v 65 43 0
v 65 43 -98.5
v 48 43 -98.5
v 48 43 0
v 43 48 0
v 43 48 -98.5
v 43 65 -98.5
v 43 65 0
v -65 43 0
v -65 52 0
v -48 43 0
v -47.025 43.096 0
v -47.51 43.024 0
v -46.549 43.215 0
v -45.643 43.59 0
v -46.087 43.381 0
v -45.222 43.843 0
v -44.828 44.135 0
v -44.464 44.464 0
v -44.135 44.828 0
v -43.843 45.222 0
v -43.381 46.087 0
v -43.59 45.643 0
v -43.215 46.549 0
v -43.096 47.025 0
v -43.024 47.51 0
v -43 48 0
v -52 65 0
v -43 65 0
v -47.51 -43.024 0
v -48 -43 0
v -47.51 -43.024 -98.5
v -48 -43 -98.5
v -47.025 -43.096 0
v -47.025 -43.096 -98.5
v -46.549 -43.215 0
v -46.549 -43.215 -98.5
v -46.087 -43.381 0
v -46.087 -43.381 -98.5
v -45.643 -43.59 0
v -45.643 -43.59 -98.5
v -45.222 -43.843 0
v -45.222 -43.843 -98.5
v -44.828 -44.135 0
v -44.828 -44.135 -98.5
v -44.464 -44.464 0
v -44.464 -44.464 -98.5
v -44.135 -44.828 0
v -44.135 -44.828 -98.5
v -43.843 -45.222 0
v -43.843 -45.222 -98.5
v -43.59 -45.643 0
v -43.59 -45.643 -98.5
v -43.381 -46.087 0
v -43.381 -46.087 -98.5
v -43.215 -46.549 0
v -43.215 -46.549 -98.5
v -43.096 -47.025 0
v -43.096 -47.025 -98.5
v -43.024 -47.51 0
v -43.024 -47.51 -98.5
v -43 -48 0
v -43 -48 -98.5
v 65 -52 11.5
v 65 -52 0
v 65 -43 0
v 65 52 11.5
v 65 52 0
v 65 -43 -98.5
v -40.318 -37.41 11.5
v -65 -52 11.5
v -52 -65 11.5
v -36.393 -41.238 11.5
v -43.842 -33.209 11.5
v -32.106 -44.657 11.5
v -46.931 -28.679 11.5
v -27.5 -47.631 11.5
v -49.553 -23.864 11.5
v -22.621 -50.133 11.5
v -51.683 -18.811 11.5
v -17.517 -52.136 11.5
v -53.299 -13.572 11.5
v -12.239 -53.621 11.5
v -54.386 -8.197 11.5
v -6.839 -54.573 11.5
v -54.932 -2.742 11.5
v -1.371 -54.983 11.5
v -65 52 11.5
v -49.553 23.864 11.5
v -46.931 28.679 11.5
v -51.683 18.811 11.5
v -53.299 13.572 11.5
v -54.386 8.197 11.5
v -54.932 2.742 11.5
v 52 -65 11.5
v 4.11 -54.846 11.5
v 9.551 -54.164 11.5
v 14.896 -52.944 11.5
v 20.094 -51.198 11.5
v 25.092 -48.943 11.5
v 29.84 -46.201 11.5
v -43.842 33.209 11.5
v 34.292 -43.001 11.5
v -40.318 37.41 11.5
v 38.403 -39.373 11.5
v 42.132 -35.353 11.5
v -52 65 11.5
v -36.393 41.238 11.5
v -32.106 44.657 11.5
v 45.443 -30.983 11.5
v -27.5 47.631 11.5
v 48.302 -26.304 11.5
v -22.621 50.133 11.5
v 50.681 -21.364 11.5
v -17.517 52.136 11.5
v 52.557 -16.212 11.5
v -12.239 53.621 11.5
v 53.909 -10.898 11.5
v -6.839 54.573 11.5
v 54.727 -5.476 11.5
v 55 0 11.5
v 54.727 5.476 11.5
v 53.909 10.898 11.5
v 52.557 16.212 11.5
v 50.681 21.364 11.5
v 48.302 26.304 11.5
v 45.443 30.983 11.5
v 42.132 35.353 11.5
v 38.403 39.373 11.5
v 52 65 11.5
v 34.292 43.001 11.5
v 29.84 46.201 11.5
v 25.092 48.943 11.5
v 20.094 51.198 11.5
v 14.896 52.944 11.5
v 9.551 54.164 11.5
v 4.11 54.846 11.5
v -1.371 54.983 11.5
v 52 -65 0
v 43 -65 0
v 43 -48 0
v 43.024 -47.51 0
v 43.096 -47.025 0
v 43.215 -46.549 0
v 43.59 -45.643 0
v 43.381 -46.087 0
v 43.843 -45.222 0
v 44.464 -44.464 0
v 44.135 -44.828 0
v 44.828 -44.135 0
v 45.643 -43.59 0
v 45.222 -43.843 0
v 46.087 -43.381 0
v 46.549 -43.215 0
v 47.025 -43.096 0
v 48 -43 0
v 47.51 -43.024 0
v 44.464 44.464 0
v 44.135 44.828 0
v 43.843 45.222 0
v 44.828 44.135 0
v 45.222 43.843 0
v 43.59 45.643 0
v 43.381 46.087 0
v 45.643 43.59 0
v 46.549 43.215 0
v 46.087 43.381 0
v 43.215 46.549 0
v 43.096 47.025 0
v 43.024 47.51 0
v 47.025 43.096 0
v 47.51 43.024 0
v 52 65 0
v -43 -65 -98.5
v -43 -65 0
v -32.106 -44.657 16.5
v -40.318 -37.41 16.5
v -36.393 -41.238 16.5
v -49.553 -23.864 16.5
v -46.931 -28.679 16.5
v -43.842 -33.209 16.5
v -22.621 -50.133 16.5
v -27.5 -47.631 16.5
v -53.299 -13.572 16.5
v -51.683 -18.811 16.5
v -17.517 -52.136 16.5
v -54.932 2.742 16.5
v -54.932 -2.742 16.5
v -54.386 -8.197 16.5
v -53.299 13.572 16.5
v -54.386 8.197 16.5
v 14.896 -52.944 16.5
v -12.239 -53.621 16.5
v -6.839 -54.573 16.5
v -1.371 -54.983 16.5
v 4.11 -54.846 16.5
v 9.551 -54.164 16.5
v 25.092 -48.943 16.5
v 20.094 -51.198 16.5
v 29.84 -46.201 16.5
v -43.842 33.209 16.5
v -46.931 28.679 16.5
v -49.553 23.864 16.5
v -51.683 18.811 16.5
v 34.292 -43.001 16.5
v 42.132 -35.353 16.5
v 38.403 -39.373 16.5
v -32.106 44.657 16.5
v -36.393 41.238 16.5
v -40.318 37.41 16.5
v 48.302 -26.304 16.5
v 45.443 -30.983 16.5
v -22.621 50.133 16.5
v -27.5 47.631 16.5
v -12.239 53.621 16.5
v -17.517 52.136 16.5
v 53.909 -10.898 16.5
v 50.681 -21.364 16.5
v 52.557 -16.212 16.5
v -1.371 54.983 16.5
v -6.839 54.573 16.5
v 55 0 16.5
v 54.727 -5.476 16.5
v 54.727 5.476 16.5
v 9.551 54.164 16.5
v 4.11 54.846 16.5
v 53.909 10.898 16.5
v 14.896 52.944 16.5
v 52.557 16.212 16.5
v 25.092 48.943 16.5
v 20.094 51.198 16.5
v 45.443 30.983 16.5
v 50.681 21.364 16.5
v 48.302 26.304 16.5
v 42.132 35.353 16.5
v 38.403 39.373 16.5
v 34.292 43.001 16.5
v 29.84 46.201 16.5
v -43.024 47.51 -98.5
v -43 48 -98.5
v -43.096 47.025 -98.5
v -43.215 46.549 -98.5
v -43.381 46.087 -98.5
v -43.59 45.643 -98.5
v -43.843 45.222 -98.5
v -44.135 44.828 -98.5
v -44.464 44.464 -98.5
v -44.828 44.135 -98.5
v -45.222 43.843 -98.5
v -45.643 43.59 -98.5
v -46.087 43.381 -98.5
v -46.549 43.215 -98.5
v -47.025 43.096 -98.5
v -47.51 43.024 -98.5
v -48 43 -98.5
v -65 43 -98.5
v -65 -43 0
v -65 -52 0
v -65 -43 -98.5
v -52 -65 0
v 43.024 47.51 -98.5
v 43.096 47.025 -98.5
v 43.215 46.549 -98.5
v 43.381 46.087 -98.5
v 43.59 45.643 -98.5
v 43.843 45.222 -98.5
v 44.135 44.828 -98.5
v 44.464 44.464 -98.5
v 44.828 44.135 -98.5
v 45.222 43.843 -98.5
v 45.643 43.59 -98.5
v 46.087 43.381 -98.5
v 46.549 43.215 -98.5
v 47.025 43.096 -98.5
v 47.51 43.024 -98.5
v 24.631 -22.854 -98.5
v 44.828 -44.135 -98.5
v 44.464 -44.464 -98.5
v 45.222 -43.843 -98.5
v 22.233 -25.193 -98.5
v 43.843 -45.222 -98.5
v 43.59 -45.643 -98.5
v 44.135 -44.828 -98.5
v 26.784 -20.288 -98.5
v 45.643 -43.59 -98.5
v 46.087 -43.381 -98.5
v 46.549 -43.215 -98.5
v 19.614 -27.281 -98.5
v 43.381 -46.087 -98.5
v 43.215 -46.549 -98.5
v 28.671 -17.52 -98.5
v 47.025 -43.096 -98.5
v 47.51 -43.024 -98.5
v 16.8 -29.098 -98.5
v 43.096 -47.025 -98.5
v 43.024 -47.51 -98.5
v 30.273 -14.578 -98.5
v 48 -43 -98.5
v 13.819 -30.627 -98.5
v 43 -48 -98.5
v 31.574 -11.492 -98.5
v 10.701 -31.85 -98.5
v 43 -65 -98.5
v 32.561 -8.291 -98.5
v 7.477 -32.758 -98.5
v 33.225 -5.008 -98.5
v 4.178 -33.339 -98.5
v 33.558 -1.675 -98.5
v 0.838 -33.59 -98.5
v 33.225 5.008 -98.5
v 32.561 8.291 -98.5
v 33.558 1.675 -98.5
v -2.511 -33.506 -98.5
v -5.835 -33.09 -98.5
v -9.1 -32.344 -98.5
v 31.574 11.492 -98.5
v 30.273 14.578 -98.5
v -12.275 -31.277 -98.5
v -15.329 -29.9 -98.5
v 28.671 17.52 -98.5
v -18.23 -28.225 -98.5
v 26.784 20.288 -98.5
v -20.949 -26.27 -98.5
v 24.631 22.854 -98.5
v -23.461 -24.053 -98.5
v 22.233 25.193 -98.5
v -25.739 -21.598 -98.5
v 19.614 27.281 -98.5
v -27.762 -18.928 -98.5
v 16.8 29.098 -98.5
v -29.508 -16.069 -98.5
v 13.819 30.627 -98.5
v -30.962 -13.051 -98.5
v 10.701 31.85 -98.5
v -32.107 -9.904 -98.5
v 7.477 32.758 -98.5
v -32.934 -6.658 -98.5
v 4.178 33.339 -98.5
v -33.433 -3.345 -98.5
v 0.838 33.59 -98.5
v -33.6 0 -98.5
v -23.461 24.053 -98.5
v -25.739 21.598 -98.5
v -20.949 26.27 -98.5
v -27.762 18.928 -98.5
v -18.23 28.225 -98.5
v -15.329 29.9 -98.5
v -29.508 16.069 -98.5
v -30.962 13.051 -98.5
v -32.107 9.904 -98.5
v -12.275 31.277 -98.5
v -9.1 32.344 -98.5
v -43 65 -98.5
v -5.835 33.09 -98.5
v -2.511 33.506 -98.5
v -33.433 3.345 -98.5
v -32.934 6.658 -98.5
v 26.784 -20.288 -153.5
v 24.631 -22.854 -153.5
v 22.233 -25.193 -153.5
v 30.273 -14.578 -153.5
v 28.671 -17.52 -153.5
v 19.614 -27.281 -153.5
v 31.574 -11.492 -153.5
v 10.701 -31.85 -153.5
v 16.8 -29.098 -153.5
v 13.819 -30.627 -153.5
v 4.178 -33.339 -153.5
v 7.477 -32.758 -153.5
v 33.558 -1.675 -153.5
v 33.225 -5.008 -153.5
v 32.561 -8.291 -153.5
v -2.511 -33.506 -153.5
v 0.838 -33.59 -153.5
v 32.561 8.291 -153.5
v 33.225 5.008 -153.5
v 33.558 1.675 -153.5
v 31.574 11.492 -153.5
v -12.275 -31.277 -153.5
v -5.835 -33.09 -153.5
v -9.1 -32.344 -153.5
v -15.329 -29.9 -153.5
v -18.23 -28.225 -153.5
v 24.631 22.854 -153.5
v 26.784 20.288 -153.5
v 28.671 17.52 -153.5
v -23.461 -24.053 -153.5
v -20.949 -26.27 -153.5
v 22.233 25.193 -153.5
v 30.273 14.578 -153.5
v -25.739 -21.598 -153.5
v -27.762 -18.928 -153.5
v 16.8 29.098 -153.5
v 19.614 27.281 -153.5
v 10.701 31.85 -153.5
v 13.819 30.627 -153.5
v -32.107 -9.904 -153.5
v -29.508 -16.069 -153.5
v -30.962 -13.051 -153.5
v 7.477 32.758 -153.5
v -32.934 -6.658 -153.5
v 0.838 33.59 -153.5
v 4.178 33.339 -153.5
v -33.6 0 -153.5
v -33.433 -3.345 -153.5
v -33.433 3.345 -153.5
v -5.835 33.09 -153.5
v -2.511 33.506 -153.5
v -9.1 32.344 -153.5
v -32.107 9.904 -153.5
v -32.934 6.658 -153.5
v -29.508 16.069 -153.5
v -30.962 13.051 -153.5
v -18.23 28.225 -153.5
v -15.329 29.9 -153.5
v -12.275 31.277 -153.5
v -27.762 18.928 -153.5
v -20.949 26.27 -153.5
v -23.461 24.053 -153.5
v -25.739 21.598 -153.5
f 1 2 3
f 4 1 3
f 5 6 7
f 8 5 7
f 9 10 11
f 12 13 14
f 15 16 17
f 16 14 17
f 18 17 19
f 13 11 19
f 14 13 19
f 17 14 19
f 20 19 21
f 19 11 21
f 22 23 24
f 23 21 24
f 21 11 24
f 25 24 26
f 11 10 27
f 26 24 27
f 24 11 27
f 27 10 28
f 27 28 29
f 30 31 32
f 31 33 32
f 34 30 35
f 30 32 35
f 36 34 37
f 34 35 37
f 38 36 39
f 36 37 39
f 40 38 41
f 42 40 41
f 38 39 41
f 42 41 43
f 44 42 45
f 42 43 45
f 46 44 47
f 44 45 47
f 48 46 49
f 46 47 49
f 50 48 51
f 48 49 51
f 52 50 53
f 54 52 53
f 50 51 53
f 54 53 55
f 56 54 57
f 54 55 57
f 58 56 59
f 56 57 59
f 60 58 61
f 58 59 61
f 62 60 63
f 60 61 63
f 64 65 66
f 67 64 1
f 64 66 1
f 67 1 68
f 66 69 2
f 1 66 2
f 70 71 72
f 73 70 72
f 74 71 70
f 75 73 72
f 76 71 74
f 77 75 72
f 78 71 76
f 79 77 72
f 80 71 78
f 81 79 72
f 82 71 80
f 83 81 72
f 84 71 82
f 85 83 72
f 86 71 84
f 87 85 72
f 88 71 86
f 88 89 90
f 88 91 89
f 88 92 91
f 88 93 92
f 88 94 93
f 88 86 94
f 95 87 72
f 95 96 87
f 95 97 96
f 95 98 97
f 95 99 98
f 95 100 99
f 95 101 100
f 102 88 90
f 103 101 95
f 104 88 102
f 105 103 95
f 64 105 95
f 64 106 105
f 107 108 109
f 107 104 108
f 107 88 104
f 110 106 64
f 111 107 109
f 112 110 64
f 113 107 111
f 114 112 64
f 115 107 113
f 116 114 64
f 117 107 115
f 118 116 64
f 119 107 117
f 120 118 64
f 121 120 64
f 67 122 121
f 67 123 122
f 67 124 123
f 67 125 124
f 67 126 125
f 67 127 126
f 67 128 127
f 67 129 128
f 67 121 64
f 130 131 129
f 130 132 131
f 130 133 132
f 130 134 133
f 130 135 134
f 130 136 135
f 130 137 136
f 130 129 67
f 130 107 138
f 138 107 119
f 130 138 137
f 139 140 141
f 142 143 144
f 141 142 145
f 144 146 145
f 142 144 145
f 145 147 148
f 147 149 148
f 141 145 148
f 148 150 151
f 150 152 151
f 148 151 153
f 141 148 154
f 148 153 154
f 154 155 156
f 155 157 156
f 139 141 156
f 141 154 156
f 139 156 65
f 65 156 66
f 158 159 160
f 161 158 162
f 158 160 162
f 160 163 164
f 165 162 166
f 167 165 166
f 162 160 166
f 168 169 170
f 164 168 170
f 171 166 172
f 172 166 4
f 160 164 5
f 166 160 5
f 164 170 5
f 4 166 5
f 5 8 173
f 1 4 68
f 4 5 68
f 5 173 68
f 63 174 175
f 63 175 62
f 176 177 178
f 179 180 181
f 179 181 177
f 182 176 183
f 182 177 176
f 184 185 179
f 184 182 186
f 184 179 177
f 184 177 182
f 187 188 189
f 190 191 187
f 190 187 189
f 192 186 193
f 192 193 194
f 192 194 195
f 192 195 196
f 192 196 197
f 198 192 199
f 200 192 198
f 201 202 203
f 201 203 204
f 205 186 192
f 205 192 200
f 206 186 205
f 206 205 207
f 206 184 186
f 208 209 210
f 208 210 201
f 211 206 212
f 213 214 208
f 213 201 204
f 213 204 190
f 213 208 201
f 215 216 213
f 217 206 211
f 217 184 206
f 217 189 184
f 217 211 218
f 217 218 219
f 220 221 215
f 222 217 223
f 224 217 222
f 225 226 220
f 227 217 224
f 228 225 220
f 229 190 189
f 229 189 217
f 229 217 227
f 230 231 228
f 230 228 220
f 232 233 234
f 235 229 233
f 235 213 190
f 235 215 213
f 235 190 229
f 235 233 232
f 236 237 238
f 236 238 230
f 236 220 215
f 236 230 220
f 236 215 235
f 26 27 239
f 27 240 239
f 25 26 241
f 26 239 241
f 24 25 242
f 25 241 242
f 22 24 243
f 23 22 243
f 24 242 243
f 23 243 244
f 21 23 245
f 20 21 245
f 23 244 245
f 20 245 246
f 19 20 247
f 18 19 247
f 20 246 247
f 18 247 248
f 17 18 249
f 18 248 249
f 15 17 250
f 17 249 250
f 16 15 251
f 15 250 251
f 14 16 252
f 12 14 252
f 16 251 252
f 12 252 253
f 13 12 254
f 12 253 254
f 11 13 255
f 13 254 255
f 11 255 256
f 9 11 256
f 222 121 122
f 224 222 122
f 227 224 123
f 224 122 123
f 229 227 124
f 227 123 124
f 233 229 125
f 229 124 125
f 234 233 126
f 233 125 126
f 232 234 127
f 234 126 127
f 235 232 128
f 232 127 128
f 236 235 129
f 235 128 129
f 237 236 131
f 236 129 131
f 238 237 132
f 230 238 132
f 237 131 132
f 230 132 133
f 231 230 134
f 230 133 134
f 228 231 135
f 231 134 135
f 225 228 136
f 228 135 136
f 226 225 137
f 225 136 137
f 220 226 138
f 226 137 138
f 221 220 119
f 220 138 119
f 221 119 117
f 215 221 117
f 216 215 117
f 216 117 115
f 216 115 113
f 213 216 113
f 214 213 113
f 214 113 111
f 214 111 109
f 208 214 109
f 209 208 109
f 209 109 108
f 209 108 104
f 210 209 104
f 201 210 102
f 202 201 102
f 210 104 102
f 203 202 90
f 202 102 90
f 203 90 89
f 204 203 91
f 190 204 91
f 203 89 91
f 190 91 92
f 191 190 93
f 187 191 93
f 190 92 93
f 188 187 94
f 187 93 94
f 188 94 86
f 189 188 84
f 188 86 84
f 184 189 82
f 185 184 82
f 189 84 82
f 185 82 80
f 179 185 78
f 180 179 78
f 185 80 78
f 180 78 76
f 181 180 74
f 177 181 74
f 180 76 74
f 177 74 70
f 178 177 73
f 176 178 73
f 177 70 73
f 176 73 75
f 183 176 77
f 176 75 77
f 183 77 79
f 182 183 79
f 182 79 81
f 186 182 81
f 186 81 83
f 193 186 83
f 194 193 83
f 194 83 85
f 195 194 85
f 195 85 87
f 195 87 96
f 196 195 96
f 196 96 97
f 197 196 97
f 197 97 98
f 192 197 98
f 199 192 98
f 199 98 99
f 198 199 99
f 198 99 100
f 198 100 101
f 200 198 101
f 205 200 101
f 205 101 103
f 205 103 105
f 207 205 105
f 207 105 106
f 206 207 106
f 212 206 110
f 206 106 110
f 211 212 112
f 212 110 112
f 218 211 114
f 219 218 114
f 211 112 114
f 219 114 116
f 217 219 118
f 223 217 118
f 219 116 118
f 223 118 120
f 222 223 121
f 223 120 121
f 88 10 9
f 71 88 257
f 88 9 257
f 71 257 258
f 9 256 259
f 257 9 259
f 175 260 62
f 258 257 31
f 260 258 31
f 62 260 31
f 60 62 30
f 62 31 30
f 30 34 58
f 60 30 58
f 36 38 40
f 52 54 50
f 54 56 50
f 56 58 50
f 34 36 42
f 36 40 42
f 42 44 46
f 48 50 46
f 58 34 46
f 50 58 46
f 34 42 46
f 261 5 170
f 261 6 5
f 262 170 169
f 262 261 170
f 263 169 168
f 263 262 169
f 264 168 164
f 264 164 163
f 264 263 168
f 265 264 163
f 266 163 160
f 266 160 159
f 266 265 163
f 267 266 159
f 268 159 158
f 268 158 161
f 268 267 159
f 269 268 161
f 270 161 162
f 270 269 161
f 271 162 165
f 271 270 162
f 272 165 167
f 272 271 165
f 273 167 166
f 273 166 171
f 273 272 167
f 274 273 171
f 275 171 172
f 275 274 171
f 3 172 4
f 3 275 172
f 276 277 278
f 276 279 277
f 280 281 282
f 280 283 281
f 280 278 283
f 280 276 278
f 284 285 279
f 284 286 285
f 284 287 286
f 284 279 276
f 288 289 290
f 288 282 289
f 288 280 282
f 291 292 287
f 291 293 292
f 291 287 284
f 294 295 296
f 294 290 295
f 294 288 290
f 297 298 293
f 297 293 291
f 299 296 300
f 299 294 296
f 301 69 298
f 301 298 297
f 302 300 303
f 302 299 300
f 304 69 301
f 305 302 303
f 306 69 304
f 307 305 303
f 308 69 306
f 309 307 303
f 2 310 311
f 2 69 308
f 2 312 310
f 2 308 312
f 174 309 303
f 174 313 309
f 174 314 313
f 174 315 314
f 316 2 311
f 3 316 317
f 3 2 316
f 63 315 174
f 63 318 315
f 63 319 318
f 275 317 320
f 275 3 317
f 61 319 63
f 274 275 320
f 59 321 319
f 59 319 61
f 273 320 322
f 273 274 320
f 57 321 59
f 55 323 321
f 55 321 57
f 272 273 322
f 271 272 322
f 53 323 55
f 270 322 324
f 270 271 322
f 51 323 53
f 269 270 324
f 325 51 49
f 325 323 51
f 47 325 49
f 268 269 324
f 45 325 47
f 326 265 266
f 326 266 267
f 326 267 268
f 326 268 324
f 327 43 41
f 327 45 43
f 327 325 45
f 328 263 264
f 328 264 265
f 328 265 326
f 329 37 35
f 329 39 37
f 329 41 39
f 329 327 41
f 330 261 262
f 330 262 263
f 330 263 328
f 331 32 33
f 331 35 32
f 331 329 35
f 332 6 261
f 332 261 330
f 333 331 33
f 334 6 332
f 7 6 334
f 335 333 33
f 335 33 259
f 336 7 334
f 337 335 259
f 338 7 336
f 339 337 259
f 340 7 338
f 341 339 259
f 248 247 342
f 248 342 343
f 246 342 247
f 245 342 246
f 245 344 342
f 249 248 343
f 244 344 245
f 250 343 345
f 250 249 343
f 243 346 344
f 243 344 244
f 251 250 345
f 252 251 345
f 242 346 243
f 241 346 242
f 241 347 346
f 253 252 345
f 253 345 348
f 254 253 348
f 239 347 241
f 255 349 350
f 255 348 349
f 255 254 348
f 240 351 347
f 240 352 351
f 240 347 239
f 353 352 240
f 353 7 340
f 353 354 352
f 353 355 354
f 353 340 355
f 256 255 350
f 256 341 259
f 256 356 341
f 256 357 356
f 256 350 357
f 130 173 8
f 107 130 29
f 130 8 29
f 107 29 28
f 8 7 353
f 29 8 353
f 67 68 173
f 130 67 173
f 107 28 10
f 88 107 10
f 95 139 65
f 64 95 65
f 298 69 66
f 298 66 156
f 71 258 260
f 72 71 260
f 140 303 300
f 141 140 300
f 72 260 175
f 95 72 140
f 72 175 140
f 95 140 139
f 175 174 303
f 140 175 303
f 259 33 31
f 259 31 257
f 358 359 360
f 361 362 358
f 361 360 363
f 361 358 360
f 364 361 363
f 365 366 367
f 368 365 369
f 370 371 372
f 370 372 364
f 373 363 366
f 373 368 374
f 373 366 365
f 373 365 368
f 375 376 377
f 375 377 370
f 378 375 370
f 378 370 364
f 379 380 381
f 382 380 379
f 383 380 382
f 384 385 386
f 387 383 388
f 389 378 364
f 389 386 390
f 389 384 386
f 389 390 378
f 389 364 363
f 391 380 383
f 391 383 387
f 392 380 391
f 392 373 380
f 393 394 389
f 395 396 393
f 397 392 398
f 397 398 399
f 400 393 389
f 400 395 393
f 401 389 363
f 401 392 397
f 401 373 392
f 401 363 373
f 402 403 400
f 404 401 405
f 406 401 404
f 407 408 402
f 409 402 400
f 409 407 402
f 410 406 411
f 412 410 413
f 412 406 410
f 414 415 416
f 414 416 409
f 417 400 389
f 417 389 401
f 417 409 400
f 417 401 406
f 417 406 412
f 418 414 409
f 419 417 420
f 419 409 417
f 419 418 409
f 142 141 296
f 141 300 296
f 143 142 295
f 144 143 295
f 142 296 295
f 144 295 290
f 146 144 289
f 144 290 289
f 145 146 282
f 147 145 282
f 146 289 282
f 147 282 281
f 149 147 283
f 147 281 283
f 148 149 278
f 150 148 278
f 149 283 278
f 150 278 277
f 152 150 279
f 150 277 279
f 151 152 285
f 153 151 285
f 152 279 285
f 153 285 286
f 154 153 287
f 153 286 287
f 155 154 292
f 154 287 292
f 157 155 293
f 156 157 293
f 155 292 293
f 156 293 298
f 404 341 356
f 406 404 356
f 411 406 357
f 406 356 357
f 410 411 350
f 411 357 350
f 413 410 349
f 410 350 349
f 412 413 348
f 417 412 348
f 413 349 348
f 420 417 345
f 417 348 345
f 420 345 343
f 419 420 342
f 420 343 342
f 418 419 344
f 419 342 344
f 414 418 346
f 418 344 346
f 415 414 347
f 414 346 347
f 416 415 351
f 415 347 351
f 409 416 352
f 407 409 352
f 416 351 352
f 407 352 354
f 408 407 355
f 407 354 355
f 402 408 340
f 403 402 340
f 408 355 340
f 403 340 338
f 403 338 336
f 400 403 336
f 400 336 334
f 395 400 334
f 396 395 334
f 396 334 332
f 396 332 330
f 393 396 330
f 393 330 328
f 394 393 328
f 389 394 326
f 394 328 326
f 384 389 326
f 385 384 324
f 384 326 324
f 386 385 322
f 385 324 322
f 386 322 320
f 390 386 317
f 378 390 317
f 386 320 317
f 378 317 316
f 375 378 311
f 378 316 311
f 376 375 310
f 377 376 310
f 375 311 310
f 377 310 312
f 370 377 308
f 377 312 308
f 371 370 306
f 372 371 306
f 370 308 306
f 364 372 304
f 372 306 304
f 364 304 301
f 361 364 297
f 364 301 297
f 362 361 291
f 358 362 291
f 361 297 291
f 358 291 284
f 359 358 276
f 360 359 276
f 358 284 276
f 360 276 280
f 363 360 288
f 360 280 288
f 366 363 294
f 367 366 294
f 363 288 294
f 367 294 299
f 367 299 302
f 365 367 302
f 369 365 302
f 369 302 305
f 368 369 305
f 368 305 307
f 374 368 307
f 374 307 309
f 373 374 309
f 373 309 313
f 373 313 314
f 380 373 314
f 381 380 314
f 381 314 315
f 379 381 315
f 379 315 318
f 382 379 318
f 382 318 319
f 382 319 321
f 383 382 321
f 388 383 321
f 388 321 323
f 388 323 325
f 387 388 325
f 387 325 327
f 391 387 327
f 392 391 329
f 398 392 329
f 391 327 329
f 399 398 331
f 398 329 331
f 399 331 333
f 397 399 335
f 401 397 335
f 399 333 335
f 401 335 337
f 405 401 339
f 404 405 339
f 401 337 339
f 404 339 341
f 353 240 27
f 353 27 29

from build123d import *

# Parameters (mm, degrees)
EXTRUDE_1_DEPTH = 11.5
SKETCH_2_R      = 55
EXTRUDE_2_DEPTH = 5
SKETCH_5_W      = 86
SKETCH_5_H      = 22
SKETCH_5_W_2    = 22
SKETCH_5_H_2    = 86
EXTRUDE_4_DEPTH = 98.5
FILLET_1_R      = 5
SKETCH_6_R      = 33.6
EXTRUDE_5_DEPTH = 55


with BuildPart() as part:
    # 草图1 → 凸台-拉伸1 (new body)
    with BuildSketch(Plane.XY):
        Polygon((-65, -52), (-52, -65), (52, -65), (65, -52), (65, 52), (52, 65), (-52, 65), (-65, 52), align=None)
    extrude(amount=EXTRUDE_1_DEPTH)

    # 草图2 → 凸台-拉伸2 (add)
    with BuildSketch(Plane.XY.offset(11.5)):
        Circle(SKETCH_2_R)
    extrude(amount=EXTRUDE_2_DEPTH)

    # 草图5 → 凸台-拉伸4 (add)
    with BuildSketch(Plane(origin=(0, 0, 0), x_dir=(-1, 0, 0), z_dir=(0, 0, -1))):
        with Locations((0, 54)):
            Rectangle(SKETCH_5_W, SKETCH_5_H)
        with Locations((-54, 0)):
            Rectangle(SKETCH_5_W_2, SKETCH_5_H_2)
        Rectangle(SKETCH_5_W, SKETCH_5_H_2)
        with Locations((54, 0)):
            Rectangle(SKETCH_5_W_2, SKETCH_5_H_2)
        with Locations((0, -54)):
            Rectangle(SKETCH_5_W, SKETCH_5_H)
    extrude(amount=EXTRUDE_4_DEPTH)

    # 圆角1
    fillet_1_edges = [part.edges().sort_by_distance(p)[0] for p in [
        (43, 43, -49.25),
        (43, -43, -49.25),
        (-43, -43, -49.25),
        (-43, 43, -49.25),
    ]]
    fillet(fillet_1_edges, radius=FILLET_1_R)

    # 草图6 → 凸台-拉伸5 (add)
    with BuildSketch(Plane(origin=(0, 0, -98.5), x_dir=(-1, 0, 0), z_dir=(0, 0, -1))):
        Circle(SKETCH_6_R)
    extrude(amount=EXTRUDE_5_DEPTH)


solid = part.part
